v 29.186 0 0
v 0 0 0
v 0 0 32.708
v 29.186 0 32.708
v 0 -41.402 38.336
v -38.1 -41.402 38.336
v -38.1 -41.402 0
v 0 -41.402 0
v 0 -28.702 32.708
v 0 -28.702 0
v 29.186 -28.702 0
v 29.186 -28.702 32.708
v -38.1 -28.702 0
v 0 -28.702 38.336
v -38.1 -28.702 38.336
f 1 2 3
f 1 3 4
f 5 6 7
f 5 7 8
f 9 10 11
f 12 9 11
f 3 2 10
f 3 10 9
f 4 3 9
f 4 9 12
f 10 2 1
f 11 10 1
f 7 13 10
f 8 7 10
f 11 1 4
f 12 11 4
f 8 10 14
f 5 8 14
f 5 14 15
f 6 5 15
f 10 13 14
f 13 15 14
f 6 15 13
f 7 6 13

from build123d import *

# Parameters (mm, degrees)
F0_W      = 29.186036
F0_H      = 32.708492
F1_DEPTH  = 28.702
F3_DEPTH  = 25.4
F3_FACE_W = 38.100344
F3_FACE_H = 38.3358
F4_DEPTH  = 12.7


with BuildPart() as f1:
    # F0 (on Front) → F1 (new body)
    with BuildSketch(Plane.XZ):
        with Locations((14.593018, 16.354246)):
            Rectangle(F0_W, F0_H)
    extrude(amount=F1_DEPTH)


with BuildPart() as f3:
    # F2 (on face) → F3 (new body)
    with BuildSketch(Plane.XZ.offset(28.702)):
        Polygon((-38.100343, 0), (0, 0), (0, 32.708492), (0, 38.3358), (-38.100343, 38.3358), align=None)
    extrude(amount=F3_DEPTH)

    # F3_face (on face) → F4 (cut)
    with BuildSketch(Plane(origin=(-19.050172, -54.102, 19.1679), x_dir=(1, 0, 0), z_dir=(0, -1, 0))):
        Rectangle(F3_FACE_W, F3_FACE_H)
    extrude(amount=-F4_DEPTH, mode=Mode.SUBTRACT)


solid = Compound([f1.part, f3.part])
